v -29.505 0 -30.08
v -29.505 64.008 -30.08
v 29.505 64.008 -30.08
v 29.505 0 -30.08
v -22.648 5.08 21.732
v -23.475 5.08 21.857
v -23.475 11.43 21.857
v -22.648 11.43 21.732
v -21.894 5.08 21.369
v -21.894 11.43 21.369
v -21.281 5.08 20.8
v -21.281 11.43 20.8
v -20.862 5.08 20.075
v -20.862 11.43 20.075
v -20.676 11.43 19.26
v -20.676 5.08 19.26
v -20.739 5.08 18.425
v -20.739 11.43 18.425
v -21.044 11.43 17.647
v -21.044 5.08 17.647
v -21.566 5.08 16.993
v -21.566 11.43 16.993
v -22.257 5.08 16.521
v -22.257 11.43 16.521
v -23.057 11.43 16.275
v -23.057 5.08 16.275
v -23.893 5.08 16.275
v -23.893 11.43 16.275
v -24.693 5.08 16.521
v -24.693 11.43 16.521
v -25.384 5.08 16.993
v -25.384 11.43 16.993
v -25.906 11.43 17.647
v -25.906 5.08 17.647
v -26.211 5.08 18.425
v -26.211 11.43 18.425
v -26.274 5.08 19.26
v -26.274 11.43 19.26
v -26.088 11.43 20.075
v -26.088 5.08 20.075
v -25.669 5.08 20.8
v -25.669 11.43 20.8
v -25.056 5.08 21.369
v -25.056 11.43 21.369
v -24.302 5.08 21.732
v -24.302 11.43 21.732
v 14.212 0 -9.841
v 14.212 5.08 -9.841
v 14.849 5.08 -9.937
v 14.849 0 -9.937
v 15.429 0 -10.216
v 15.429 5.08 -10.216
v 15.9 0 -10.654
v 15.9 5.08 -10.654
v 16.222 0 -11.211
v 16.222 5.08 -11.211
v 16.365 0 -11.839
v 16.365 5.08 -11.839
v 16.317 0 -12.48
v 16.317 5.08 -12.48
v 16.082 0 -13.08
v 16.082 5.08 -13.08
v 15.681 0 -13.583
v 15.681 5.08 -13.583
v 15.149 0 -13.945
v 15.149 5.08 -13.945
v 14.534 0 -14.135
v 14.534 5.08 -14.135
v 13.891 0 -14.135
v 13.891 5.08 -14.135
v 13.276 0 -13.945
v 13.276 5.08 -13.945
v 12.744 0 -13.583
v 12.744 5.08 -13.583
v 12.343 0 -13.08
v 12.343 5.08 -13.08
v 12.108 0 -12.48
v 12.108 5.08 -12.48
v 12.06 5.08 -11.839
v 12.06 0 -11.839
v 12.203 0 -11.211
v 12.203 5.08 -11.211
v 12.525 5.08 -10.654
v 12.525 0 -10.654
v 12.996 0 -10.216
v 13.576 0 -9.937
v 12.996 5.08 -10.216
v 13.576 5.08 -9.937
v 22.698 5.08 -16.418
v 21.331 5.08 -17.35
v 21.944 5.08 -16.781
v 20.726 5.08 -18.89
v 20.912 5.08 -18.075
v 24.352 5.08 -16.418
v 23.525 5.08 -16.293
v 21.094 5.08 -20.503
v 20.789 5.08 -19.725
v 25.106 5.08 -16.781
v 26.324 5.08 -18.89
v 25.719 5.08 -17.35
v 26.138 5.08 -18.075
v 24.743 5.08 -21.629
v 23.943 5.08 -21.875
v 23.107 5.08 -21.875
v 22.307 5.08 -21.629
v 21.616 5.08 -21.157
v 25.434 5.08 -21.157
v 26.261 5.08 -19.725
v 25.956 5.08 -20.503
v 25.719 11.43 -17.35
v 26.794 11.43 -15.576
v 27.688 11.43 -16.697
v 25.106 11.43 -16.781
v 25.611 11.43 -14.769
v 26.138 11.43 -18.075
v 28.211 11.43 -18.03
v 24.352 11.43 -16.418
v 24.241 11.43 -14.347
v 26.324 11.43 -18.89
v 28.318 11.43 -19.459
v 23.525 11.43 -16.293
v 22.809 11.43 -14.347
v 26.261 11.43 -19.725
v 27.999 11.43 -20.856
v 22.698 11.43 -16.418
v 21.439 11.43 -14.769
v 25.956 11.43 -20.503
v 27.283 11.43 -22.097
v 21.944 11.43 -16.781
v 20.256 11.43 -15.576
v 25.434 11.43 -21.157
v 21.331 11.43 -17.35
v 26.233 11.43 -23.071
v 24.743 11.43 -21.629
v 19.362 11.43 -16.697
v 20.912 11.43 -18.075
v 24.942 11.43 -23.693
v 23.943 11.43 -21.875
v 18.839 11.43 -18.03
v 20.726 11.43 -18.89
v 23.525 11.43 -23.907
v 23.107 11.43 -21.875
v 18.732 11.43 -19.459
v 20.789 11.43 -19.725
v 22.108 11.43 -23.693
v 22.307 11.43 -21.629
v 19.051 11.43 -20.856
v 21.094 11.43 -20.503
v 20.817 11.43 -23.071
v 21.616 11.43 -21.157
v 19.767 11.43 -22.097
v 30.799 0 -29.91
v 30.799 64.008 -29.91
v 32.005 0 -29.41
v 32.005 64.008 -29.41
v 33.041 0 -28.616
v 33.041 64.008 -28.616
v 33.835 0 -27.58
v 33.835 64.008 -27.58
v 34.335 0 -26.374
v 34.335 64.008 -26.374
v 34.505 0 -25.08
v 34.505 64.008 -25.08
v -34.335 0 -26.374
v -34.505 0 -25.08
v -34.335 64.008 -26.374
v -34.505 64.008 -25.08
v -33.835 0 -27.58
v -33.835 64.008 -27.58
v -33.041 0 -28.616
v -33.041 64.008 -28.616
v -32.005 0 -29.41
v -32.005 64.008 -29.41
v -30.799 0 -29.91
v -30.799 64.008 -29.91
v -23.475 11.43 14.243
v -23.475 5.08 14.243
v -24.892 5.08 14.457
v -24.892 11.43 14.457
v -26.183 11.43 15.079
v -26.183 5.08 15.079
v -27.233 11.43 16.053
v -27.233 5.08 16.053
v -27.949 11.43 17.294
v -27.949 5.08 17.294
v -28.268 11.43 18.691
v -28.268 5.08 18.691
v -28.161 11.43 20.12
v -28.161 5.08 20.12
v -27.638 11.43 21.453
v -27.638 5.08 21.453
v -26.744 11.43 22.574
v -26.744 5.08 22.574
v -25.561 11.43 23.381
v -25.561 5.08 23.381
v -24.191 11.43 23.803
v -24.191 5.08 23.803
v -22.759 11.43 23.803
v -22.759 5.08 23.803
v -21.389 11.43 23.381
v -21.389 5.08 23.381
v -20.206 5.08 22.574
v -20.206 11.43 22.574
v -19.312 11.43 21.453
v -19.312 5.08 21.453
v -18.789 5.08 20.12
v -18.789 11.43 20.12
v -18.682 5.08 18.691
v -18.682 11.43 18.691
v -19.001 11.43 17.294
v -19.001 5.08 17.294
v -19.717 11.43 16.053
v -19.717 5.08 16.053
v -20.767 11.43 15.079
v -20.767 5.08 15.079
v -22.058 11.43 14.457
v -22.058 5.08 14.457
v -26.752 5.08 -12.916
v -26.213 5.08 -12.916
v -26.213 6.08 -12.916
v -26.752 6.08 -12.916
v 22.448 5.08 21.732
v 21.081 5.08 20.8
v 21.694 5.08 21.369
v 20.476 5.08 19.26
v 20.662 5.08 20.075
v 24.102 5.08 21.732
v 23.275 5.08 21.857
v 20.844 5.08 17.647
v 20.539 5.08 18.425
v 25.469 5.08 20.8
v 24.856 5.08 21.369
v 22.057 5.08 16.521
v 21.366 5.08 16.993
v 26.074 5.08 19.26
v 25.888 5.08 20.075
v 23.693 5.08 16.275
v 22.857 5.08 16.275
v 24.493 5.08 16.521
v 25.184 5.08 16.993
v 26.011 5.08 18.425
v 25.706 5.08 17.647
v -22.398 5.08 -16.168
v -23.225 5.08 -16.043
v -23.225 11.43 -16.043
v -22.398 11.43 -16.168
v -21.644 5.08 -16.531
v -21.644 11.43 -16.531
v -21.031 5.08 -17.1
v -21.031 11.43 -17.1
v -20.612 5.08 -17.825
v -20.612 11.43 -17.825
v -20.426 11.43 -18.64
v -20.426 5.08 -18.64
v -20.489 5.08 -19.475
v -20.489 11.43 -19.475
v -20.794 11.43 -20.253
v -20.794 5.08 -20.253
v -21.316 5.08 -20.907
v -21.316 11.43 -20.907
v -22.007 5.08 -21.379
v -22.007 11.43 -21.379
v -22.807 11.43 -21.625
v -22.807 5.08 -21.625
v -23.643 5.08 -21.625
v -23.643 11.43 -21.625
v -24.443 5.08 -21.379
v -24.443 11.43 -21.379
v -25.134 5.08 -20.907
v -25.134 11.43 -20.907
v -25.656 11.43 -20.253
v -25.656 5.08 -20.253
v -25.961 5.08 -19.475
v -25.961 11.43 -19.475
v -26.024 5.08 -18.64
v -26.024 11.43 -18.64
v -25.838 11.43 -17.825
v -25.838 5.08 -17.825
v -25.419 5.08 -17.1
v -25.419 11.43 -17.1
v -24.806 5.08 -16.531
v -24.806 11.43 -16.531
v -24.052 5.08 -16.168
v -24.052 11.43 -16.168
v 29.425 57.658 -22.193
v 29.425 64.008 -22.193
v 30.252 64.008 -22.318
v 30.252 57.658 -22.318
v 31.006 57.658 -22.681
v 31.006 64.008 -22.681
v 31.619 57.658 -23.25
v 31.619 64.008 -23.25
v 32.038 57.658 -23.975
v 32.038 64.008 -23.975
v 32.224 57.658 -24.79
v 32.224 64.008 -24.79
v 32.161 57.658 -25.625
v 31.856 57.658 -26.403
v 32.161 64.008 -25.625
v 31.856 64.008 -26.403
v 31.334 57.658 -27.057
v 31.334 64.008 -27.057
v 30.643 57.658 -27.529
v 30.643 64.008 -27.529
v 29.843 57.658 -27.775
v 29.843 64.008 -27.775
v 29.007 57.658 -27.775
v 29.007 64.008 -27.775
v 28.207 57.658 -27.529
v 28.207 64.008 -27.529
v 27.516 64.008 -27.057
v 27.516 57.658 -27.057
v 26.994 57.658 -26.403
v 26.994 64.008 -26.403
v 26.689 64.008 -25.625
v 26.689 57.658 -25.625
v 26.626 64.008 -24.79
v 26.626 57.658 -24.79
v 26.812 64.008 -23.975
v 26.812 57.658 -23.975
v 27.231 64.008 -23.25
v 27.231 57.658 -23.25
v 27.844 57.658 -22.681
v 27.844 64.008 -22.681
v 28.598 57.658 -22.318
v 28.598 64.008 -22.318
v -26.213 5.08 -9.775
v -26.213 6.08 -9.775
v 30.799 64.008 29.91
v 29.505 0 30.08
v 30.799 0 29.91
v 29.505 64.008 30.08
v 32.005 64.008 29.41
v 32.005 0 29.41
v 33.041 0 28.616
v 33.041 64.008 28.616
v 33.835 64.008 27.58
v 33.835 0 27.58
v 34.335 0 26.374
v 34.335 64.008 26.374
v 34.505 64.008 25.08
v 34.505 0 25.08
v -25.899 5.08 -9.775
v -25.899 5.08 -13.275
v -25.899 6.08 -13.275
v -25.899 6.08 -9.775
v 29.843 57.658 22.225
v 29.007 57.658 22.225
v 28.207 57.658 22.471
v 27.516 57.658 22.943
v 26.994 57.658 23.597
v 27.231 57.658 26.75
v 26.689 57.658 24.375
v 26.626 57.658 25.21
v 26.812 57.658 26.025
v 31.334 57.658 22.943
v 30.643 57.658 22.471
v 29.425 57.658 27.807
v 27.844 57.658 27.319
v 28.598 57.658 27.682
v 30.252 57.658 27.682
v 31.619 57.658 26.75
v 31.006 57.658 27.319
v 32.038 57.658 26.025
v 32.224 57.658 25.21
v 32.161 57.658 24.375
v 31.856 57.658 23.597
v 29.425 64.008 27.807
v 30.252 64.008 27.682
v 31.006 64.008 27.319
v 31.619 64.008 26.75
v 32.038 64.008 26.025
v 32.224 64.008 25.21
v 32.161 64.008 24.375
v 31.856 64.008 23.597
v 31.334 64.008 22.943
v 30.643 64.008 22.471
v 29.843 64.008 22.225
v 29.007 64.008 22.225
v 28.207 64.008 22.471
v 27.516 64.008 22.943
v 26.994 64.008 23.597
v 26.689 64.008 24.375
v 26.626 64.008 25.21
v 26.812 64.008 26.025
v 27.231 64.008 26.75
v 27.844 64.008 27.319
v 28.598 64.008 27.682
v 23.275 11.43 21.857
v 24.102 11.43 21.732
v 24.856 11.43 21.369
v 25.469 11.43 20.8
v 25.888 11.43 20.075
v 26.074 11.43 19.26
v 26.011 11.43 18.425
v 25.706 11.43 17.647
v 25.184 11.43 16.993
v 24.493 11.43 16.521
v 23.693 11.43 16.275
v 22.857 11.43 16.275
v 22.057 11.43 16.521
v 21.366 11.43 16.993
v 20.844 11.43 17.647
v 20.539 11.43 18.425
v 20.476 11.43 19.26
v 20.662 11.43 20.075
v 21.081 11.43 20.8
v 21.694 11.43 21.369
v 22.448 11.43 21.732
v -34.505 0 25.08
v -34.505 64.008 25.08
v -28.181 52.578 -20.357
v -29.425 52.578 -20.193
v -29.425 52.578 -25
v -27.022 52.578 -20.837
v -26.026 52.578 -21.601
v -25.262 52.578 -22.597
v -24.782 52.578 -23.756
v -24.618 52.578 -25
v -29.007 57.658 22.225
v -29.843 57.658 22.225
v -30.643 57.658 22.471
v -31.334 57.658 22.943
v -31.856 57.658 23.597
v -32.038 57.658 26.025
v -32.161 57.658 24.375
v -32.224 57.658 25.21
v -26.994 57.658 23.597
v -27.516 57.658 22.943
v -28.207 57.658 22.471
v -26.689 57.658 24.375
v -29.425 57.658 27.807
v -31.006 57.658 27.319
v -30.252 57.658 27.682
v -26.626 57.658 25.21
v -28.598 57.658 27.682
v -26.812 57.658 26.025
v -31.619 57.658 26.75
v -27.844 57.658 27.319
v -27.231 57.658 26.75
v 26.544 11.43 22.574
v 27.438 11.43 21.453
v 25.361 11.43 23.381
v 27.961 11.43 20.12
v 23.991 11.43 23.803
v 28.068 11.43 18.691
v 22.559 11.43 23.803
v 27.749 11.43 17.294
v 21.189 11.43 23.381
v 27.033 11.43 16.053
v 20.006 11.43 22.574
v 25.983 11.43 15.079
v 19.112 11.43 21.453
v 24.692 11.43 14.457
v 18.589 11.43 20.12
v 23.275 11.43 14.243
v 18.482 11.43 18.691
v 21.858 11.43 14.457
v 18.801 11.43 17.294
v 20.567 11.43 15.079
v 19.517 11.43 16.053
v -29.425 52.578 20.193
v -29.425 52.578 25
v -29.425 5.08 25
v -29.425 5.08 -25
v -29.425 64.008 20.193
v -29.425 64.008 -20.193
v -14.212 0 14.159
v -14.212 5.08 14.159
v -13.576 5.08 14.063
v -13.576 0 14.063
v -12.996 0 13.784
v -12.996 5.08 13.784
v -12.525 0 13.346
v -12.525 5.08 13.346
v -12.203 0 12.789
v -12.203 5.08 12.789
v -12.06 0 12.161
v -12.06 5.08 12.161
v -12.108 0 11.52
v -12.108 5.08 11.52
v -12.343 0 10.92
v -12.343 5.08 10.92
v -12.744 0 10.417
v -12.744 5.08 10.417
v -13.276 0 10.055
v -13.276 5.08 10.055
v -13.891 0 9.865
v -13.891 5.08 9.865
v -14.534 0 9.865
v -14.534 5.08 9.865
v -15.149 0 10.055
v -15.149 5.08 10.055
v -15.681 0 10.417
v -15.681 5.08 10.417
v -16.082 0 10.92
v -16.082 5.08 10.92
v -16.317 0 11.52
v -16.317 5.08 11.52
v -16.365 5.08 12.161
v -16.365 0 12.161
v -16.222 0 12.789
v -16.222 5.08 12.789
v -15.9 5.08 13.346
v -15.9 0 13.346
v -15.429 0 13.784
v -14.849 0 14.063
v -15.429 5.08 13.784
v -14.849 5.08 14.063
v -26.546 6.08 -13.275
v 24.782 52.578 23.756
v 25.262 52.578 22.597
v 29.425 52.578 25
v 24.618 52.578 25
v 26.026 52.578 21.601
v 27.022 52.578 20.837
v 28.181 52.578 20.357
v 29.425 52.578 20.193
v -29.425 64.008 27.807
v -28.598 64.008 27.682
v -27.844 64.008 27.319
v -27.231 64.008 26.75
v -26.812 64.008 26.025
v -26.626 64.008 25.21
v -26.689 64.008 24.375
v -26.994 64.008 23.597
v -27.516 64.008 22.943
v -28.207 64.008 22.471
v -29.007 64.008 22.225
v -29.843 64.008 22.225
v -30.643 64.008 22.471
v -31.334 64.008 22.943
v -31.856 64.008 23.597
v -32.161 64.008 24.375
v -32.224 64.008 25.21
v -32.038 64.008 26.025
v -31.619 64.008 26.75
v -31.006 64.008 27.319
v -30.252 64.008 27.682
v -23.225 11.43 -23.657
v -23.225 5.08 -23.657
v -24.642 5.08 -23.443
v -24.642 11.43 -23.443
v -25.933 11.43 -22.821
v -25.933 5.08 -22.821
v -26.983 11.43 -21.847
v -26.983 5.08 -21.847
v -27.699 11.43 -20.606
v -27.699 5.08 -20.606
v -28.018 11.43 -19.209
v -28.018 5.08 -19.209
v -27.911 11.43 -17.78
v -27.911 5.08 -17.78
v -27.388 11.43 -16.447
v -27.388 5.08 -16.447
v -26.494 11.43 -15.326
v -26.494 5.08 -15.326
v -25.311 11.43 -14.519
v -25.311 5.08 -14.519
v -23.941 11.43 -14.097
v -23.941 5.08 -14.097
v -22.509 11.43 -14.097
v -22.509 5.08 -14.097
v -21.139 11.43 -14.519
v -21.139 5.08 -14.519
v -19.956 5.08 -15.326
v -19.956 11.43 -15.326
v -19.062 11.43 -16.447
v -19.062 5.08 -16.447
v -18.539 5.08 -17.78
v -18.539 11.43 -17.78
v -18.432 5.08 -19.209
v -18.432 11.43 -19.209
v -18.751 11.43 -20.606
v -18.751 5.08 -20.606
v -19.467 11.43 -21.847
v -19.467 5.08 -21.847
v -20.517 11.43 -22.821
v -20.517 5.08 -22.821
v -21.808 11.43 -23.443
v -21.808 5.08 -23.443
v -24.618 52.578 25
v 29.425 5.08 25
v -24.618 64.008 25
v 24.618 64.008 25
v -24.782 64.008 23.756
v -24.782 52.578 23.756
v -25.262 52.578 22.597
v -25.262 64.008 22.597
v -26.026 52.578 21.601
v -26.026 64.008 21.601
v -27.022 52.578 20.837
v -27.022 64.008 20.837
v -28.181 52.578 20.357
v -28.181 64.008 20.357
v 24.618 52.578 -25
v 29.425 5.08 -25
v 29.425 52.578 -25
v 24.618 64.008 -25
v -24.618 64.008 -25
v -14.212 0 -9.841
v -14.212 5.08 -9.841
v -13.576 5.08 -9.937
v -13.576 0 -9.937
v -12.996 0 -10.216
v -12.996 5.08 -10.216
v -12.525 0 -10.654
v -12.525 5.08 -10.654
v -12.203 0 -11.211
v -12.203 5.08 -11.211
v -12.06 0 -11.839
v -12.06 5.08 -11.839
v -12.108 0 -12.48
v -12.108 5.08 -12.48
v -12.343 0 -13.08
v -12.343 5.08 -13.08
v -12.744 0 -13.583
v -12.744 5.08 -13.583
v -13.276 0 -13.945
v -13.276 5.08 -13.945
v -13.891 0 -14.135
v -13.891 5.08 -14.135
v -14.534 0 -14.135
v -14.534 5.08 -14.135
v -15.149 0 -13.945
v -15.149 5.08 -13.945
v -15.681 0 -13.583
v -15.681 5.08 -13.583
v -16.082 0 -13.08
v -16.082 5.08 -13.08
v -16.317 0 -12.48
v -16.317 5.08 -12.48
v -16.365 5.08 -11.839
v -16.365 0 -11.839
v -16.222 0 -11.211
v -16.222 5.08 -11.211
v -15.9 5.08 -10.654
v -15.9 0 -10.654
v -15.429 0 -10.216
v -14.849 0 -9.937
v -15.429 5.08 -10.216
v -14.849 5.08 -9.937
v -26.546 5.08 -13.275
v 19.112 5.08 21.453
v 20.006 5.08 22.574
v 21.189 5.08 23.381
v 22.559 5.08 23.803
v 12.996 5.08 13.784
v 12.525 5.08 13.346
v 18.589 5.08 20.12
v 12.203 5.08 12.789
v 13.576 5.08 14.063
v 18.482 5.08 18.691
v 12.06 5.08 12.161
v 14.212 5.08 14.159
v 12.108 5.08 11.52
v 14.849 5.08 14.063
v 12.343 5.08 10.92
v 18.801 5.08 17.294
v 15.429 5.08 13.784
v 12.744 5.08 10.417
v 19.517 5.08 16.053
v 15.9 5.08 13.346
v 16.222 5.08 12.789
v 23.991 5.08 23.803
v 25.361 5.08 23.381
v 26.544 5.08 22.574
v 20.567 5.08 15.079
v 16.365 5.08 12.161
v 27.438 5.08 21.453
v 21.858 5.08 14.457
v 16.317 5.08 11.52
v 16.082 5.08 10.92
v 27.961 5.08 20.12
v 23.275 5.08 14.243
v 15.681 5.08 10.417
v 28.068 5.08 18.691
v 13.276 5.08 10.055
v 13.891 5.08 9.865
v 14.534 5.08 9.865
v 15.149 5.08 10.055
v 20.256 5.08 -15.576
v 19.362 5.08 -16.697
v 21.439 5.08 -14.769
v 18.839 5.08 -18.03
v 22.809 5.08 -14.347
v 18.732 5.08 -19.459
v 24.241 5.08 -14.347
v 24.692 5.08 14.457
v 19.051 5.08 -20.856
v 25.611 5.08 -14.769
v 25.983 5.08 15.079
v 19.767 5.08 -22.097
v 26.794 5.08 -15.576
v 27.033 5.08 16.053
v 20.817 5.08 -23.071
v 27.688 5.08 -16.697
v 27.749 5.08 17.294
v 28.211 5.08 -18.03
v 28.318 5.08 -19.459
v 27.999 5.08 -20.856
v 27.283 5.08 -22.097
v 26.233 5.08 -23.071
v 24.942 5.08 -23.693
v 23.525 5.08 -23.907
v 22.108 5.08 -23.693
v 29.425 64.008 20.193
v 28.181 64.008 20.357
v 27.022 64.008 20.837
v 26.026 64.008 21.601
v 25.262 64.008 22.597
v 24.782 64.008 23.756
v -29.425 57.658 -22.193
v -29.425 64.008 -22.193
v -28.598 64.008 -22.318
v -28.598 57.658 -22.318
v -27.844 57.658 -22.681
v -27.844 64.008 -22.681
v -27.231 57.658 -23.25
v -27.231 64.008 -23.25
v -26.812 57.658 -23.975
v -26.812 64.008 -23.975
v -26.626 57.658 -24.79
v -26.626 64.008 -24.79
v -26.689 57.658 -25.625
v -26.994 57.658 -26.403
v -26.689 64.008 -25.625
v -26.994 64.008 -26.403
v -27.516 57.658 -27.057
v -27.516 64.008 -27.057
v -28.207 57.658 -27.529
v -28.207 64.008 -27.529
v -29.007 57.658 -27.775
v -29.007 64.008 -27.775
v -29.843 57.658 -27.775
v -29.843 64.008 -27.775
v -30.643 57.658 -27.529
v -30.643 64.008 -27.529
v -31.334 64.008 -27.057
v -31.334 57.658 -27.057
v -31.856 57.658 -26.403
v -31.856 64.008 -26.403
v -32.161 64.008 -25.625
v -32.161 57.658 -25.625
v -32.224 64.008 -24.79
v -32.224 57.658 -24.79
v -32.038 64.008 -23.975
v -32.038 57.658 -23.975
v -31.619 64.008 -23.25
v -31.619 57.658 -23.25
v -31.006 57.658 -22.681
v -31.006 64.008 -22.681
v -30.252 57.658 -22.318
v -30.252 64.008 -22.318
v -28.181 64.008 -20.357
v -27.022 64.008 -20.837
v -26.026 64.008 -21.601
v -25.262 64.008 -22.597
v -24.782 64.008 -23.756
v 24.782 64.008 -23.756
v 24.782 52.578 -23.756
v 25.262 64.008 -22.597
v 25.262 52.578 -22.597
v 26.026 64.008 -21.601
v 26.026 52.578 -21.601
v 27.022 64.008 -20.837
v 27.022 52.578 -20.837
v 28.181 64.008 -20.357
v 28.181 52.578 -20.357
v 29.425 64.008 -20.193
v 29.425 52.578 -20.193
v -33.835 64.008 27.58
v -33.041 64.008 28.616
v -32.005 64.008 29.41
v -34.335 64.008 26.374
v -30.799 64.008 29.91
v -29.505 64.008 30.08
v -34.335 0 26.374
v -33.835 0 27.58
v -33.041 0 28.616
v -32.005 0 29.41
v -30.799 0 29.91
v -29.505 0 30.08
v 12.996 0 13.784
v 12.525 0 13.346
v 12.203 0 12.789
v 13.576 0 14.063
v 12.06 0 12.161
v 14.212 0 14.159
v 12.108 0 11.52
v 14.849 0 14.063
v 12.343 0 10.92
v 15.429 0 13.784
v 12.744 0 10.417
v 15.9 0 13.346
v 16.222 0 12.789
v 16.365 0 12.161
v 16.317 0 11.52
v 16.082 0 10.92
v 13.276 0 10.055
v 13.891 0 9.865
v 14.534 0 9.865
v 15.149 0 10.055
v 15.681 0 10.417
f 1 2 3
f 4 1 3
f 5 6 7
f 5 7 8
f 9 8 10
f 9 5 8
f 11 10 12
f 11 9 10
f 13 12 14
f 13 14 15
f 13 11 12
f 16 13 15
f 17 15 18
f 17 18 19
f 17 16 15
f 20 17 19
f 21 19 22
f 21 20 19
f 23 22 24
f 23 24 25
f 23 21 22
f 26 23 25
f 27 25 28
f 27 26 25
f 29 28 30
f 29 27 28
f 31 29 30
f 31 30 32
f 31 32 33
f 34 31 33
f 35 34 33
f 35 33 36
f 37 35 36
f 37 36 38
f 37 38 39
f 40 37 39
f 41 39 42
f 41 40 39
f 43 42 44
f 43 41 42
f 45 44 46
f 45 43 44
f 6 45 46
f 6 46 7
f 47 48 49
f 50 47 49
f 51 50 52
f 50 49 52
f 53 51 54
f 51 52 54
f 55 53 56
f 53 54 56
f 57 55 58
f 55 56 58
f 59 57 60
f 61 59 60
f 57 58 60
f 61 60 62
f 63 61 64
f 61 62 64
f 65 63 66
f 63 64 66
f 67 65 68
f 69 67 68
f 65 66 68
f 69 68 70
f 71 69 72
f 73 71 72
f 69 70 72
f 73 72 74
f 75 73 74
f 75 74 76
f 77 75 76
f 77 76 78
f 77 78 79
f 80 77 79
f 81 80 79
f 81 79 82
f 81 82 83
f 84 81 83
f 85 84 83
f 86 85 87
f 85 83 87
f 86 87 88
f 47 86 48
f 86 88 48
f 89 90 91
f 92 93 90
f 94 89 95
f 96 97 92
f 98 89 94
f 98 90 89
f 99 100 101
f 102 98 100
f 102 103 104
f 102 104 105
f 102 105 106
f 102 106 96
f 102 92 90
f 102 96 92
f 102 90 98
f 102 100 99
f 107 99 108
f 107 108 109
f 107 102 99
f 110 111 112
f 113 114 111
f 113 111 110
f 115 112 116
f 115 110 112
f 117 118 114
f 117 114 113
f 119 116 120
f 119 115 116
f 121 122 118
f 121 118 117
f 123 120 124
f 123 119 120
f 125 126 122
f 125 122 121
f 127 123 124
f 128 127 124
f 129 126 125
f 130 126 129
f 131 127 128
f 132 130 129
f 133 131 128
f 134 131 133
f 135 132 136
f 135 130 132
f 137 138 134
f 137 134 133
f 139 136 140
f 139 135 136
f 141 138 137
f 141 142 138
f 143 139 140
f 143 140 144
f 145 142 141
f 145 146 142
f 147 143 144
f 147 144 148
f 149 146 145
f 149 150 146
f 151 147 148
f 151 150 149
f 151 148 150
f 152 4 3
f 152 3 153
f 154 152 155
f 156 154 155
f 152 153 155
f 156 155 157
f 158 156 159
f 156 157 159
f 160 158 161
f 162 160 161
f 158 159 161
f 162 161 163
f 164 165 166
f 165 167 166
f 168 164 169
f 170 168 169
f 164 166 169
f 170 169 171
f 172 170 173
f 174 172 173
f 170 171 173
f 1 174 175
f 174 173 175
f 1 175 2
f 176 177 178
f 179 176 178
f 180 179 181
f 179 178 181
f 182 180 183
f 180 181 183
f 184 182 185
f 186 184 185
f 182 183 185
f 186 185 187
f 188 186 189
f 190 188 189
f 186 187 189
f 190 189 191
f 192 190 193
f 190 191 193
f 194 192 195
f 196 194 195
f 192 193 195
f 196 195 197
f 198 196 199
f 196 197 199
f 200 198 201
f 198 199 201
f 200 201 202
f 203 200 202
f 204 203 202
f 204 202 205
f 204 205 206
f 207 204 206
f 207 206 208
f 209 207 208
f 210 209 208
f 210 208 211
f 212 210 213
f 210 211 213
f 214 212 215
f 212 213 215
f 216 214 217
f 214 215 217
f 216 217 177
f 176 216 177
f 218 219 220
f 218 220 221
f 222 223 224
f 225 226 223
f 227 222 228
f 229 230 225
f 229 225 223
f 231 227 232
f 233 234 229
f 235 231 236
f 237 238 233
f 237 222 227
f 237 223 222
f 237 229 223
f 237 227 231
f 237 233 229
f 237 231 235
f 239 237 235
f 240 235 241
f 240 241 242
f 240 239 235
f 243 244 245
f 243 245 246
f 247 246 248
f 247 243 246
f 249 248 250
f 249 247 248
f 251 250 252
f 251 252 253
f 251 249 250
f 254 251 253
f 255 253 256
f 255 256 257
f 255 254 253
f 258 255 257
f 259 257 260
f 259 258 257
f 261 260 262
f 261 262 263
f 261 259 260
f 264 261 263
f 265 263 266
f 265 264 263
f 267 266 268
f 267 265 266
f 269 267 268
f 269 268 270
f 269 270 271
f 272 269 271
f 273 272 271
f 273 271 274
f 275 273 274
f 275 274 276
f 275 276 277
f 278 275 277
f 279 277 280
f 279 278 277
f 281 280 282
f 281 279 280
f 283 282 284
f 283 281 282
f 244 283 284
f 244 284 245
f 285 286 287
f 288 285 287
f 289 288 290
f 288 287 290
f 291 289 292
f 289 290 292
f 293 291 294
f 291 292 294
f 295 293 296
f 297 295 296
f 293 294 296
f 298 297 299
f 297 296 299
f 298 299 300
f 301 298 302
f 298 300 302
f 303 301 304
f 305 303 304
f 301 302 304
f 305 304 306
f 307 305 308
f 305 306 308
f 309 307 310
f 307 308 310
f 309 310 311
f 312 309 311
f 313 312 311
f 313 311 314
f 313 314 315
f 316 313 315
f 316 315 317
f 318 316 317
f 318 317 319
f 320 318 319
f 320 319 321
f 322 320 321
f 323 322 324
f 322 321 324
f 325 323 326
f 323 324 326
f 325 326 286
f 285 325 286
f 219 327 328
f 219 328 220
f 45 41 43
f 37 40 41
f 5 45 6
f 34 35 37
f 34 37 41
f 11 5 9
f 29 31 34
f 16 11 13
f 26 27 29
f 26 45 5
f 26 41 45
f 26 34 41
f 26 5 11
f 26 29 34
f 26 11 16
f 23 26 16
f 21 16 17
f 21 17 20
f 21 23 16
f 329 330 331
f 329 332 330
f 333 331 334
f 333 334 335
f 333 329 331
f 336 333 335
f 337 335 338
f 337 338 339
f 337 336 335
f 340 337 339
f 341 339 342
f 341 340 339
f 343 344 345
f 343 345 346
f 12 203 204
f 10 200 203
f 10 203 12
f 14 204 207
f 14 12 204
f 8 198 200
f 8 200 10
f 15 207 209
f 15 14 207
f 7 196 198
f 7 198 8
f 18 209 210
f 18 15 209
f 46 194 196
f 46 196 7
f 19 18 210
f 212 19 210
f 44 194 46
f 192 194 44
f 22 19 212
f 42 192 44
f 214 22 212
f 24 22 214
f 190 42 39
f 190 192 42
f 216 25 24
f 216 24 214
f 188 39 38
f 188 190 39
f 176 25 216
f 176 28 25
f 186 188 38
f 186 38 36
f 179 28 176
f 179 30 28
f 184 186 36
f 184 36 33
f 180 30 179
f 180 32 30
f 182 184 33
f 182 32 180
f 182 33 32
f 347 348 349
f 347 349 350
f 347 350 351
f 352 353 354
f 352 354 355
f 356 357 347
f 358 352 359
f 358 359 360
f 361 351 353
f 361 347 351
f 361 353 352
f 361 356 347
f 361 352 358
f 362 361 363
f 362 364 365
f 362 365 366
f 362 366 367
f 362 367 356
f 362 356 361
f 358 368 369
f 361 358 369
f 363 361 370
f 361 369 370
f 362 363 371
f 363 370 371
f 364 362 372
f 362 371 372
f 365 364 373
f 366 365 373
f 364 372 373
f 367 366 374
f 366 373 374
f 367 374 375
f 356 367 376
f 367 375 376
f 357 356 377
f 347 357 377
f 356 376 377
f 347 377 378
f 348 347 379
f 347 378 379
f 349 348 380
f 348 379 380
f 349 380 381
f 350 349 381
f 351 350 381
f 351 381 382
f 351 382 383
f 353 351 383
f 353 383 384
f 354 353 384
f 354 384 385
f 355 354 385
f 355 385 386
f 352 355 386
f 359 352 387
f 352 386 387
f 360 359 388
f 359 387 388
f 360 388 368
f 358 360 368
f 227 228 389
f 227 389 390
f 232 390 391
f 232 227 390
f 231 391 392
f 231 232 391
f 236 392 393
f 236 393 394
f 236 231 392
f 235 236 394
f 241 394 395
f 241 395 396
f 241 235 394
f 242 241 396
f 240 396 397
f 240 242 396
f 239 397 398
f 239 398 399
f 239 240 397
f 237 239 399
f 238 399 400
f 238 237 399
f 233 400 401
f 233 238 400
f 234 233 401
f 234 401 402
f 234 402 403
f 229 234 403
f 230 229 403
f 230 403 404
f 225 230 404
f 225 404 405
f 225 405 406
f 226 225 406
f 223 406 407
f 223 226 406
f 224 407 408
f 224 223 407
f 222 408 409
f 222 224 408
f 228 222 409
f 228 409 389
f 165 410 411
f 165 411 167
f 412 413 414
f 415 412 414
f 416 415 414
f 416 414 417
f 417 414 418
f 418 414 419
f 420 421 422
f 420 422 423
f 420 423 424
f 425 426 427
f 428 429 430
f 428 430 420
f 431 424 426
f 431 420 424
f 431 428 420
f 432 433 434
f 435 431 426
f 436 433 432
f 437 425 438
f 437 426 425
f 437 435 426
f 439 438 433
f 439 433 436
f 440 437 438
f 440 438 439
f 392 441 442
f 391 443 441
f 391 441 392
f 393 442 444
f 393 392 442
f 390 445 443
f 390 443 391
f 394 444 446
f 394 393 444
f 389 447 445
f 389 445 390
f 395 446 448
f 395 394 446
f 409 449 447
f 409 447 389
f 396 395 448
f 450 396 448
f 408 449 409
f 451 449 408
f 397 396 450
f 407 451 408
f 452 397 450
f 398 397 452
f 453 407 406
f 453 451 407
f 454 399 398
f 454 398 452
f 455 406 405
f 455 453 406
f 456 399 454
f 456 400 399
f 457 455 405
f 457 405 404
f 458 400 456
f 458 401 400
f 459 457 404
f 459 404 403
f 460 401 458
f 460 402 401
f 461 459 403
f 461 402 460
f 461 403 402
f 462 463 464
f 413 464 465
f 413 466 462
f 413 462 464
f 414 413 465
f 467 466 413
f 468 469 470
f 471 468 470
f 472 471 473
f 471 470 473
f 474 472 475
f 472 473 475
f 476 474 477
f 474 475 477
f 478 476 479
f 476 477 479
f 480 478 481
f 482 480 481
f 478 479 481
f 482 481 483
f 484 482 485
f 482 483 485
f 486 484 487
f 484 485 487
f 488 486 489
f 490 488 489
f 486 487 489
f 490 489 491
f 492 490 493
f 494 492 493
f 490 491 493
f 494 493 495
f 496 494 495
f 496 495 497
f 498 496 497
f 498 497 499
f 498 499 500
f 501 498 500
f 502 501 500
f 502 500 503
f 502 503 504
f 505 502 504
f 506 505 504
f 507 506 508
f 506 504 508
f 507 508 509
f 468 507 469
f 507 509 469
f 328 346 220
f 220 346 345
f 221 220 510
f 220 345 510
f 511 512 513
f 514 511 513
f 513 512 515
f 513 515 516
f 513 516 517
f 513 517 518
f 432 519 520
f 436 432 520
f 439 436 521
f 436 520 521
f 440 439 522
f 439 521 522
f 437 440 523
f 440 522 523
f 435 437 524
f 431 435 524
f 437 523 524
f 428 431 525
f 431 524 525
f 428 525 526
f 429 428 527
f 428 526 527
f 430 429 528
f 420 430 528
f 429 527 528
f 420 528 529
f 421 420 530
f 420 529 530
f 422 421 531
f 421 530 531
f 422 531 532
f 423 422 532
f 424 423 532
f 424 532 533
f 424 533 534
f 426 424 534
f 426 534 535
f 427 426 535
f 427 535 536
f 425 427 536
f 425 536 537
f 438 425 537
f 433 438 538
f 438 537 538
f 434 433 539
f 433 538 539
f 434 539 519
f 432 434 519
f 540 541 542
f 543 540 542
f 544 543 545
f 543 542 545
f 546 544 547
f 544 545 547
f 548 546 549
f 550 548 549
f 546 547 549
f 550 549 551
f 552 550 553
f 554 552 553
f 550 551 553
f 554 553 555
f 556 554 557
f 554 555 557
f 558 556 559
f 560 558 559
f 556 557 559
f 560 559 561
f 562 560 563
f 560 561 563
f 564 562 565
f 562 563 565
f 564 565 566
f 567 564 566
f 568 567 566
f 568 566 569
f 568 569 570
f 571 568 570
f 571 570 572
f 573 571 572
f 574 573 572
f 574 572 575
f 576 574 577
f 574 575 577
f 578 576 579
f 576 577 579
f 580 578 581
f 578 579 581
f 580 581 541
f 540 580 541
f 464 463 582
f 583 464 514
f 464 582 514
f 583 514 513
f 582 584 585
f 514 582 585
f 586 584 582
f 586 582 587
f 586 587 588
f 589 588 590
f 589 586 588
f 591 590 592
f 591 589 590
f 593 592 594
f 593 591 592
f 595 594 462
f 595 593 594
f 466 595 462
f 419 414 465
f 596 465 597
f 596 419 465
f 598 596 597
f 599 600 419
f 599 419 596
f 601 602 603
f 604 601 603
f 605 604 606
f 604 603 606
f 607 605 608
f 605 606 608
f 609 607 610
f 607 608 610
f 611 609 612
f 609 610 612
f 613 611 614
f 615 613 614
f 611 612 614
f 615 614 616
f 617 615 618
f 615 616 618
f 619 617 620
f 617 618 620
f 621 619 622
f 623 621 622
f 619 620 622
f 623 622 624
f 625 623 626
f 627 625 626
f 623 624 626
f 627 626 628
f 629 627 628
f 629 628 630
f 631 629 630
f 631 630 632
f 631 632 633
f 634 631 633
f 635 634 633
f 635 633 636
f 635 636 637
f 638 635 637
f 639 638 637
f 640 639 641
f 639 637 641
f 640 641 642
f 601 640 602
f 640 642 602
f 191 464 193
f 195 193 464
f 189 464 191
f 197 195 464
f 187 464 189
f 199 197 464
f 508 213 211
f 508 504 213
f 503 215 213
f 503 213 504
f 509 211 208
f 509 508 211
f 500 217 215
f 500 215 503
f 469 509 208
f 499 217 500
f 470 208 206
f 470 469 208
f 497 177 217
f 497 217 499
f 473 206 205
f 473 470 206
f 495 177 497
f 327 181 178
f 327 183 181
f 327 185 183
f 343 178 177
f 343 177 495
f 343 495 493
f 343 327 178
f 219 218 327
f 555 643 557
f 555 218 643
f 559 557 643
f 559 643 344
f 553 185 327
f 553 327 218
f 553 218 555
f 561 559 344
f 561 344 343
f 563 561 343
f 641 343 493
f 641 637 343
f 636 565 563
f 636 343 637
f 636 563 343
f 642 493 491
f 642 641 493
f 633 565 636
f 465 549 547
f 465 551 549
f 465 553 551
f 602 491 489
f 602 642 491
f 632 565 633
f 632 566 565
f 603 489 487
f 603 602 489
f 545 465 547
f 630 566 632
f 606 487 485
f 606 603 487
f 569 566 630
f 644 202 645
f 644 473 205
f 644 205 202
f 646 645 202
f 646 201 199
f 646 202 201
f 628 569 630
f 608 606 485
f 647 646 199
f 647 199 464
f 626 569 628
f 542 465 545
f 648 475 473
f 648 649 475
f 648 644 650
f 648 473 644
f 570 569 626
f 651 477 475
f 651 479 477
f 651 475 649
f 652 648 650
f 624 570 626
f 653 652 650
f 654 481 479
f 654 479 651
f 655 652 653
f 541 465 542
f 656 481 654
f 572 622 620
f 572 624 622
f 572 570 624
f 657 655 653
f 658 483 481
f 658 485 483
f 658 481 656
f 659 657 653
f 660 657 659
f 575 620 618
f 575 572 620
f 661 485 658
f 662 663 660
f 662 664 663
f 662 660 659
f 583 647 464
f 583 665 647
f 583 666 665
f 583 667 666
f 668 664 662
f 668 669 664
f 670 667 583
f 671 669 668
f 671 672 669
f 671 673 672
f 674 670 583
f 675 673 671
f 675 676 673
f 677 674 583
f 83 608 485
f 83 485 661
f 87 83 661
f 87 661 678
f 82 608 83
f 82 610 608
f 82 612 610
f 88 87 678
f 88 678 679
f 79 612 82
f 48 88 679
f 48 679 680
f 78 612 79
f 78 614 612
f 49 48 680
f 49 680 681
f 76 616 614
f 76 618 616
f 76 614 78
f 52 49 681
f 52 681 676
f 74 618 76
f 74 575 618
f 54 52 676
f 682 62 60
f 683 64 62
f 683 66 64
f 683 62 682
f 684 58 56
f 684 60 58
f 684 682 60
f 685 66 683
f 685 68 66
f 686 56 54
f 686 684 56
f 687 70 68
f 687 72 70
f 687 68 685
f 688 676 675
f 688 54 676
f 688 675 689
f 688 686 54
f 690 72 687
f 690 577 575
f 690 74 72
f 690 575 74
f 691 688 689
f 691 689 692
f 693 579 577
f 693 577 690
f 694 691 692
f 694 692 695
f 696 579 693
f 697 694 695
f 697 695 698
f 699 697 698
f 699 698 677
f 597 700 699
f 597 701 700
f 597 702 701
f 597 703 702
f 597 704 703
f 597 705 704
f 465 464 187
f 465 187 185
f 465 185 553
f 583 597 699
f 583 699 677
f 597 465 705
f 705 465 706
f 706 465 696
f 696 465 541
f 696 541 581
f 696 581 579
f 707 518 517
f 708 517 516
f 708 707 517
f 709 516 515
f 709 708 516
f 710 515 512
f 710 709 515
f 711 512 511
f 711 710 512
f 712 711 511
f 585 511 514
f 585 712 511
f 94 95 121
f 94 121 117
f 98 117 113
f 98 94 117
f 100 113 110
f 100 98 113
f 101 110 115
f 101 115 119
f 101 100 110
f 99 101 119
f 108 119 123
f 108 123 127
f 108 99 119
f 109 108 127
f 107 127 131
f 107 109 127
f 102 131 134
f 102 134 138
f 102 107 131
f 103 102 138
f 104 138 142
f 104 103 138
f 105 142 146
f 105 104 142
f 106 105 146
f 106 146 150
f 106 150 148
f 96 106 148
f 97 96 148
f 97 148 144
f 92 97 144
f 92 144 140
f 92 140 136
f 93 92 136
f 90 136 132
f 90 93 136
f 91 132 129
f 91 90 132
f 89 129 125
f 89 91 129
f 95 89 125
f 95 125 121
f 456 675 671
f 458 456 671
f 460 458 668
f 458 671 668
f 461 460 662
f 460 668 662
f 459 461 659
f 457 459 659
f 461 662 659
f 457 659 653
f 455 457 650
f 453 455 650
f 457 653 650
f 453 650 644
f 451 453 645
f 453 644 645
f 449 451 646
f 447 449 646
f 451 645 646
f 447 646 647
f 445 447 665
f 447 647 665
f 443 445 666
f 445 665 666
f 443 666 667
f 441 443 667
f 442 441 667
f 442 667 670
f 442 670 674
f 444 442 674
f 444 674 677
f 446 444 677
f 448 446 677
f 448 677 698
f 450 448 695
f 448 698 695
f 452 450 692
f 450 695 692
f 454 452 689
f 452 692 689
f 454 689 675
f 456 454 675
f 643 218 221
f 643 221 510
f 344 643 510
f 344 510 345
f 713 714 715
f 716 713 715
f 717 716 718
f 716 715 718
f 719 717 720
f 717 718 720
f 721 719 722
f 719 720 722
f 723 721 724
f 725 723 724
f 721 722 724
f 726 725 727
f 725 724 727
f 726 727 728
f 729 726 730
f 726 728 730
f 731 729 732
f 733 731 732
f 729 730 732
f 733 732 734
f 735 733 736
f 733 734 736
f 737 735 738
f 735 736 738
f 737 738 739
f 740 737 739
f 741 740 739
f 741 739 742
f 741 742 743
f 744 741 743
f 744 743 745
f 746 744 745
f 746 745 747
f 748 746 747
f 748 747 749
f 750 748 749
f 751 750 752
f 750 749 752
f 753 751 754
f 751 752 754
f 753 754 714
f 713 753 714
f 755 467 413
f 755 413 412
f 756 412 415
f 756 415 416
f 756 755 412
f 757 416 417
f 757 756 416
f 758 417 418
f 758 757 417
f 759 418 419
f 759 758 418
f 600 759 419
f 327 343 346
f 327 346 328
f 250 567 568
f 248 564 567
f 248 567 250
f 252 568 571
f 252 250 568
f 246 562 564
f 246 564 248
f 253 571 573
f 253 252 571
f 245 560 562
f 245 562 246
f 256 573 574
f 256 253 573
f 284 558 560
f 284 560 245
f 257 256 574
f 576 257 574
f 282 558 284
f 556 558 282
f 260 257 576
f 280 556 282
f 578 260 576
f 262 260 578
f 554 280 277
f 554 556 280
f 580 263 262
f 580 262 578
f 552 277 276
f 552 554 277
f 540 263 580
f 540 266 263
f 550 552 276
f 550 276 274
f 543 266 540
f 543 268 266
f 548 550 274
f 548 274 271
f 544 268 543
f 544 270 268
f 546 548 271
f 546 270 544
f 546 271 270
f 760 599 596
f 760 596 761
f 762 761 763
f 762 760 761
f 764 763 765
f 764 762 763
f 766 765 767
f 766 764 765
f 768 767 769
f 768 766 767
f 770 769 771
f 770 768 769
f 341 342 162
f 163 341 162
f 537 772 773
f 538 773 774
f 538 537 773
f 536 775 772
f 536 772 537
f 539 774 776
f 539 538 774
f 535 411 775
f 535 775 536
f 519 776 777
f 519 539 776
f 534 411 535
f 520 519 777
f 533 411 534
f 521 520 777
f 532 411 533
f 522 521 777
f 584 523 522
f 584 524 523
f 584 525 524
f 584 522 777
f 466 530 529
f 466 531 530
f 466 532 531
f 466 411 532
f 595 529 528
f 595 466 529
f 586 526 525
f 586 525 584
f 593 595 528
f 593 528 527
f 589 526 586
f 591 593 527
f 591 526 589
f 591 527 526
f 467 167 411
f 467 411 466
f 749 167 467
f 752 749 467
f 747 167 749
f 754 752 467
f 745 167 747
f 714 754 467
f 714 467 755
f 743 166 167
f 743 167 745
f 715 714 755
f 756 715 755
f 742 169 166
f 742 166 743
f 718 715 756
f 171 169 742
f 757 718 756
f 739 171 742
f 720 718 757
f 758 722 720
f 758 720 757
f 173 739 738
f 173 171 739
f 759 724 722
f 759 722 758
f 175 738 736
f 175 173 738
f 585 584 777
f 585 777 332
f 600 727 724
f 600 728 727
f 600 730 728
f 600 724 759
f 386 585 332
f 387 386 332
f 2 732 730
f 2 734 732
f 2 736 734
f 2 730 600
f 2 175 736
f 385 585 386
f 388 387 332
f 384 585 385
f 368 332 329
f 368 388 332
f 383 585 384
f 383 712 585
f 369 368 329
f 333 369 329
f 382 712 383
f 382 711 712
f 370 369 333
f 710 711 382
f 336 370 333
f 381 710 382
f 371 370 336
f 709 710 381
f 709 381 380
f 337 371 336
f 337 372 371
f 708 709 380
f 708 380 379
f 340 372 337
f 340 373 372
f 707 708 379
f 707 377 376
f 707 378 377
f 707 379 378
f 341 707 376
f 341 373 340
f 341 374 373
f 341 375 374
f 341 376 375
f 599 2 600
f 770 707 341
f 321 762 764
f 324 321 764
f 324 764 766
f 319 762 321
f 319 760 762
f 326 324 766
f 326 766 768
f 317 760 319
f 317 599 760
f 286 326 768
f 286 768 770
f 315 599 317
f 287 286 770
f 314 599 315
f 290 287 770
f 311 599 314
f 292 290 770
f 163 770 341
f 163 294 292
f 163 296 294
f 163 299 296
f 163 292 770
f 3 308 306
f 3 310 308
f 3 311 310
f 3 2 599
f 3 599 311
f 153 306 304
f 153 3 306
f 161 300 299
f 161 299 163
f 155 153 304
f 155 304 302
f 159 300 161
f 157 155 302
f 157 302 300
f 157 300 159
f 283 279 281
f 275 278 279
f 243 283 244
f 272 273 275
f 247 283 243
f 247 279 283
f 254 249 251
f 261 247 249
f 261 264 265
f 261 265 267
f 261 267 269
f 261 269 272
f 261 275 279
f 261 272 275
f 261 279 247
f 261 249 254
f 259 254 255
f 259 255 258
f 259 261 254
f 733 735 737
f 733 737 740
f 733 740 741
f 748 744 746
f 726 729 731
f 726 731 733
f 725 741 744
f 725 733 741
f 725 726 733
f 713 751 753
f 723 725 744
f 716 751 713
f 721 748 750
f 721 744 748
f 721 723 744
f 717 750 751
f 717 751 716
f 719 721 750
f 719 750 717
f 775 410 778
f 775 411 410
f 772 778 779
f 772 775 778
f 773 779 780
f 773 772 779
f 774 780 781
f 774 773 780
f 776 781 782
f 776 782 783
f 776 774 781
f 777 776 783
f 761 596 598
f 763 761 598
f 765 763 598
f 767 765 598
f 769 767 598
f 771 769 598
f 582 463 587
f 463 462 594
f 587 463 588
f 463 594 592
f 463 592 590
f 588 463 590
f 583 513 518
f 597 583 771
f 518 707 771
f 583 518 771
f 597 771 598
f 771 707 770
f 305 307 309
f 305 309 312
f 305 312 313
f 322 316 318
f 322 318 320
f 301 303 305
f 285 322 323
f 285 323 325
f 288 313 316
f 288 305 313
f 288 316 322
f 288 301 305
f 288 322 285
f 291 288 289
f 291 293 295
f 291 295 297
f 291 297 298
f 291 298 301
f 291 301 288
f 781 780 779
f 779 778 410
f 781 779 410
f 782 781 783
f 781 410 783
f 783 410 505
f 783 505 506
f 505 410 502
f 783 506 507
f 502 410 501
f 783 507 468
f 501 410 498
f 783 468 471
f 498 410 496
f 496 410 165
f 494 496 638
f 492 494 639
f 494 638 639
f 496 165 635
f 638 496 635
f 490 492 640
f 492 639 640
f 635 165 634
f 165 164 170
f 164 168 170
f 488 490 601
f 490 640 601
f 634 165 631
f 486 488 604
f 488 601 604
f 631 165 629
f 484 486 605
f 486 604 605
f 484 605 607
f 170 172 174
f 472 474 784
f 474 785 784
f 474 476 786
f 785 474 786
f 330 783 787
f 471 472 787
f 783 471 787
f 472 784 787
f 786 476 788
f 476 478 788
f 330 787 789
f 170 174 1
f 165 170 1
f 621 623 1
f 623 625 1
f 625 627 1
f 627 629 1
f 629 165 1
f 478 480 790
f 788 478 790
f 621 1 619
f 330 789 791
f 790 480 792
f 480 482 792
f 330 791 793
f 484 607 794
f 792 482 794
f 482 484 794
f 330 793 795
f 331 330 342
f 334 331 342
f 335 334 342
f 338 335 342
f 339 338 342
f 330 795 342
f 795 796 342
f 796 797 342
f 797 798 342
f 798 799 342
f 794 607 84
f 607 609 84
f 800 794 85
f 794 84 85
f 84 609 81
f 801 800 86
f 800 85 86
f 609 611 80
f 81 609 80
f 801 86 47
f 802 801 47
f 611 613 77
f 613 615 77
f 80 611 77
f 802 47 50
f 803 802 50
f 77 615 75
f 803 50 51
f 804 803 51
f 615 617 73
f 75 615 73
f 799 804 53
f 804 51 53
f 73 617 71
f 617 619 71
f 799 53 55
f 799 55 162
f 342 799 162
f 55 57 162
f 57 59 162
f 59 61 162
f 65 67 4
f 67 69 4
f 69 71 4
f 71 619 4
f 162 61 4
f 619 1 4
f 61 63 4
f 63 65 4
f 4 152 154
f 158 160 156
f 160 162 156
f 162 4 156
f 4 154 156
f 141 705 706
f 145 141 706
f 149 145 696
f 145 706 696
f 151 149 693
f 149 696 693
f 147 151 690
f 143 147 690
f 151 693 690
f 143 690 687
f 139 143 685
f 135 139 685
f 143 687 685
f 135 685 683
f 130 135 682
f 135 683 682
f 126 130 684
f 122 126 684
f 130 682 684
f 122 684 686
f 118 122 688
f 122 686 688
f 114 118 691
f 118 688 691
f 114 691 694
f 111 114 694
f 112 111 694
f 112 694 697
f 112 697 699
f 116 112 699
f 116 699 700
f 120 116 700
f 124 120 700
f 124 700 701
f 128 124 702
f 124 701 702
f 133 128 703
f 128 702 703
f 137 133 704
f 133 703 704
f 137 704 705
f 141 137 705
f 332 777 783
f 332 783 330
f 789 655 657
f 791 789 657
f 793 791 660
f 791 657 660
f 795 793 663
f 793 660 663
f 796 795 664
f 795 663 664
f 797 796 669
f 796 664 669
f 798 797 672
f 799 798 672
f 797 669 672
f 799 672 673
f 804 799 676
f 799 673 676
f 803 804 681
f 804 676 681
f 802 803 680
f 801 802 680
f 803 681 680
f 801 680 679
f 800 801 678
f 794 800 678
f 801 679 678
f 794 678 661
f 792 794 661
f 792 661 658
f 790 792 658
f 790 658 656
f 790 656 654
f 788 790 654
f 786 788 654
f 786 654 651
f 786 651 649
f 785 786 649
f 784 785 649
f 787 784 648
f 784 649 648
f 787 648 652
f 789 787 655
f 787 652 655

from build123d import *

# Parameters (mm, degrees)
SKETCH1_W           = 69.01
SKETCH1_H           = 60.16
BOSS_EXTRUDE3_DEPTH = 64.008
SKETCH2_W           = 58.85
SKETCH2_H           = 50
CUT_EXTRUDE4_DEPTH  = 58.928
FILLET1_R           = 5
SKETCH3_R           = 4.8067
BOSS_EXTRUDE4_DEPTH = 11.43
SKETCH3_3_R         = 2.8067
CUT_EXTRUDE5_DEPTH  = 6.35
SKETCH9_R           = 4.8067
SKETCH9_R_2         = 2.8067
BOSS_EXTRUDE5_DEPTH = 6.35
SKETCH10_R          = 2.159
CUT_EXTRUDE6_DEPTH  = 5.08
BOSS_EXTRUDE6_DEPTH = 1


with BuildPart() as part:
    # Sketch1 → Boss-Extrude3 (new body)
    with BuildSketch(Plane(origin=(0, 0, 0), x_dir=(1, 0, 0), z_dir=(0, 1, 0))):
        Rectangle(SKETCH1_W, SKETCH1_H)
    extrude(amount=BOSS_EXTRUDE3_DEPTH)

    # Sketch2 → Cut-Extrude4 (cut)
    with BuildSketch(Plane(origin=(0, 64.008, 0), x_dir=(1, 0, 0), z_dir=(0, 1, 0))):
        Rectangle(SKETCH2_W, SKETCH2_H)
    extrude(amount=-CUT_EXTRUDE4_DEPTH, mode=Mode.SUBTRACT)

    # Fillet1
    fillet1_edges = [part.edges().sort_by_distance(p)[0] for p in [
        (-34.505, 32.004, 30.08),
        (34.505, 32.004, 30.08),
        (34.505, 32.004, -30.08),
        (-34.505, 32.004, -30.08),
    ]]
    fillet(fillet1_edges, radius=FILLET1_R)

    # Sketch3 → Boss-Extrude4 (add)
    with BuildSketch(Plane(origin=(0, 64.008, 0), x_dir=(1, 0, 0), z_dir=(0, 1, 0))):
        with Locations((-29.425, 25)):
            Circle(SKETCH3_R)
        with Locations((29.425, 25)):
            Circle(SKETCH3_R)
        with Locations((-29.425, -25)):
            Circle(SKETCH3_R)
        with Locations((29.425, -25)):
            Circle(SKETCH3_R)
    extrude(amount=-BOSS_EXTRUDE4_DEPTH)

    # Sketch3<3> → Cut-Extrude5 (cut)
    with BuildSketch(Plane(origin=(0, 64.008, 0), x_dir=(1, 0, 0), z_dir=(0, 1, 0))):
        with Locations(Location((-29.425, 25, 0), (0, 0, 270))):
            Circle(SKETCH3_3_R)
        with Locations(Location((29.425, 25, 0), (0, 0, 270))):
            Circle(SKETCH3_3_R)
        with Locations(Location((29.425, -25, 0), (0, 0, 270))):
            Circle(SKETCH3_3_R)
        with Locations(Location((-29.425, -25, 0), (0, 0, 270))):
            Circle(SKETCH3_3_R)
    extrude(amount=-CUT_EXTRUDE5_DEPTH, mode=Mode.SUBTRACT)

    # Sketch9 → Boss-Extrude5 (add)
    # profile 1 of 4: a face of its own
    with BuildSketch(Plane(origin=(0, 5.08, 0), x_dir=(1, 0, 0), z_dir=(0, 1, 0))):
        with Locations(Location((-23.225, 18.85, 0), (0, 0, 90))):
            Circle(SKETCH9_R)
        with Locations(Location((-23.225, 18.85, 0), (0, 0, 270))):
            Circle(SKETCH9_R_2, mode=Mode.SUBTRACT)
    # profile 2 of 4: a face of its own
    with BuildSketch(Plane(origin=(0, 5.08, 0), x_dir=(1, 0, 0), z_dir=(0, 1, 0))):
        with Locations(Location((23.525, 19.1, 0), (0, 0, 90))):
            Circle(SKETCH9_R)
        with Locations(Location((23.525, 19.1, 0), (0, 0, 270))):
            Circle(SKETCH9_R_2, mode=Mode.SUBTRACT)
    # profile 3 of 4: a face of its own
    with BuildSketch(Plane(origin=(0, 5.08, 0), x_dir=(1, 0, 0), z_dir=(0, 1, 0))):
        with Locations(Location((23.275, -19.05, 0), (0, 0, 90))):
            Circle(SKETCH9_R)
        with Locations(Location((23.275, -19.05, 0), (0, 0, 270))):
            Circle(SKETCH9_R_2, mode=Mode.SUBTRACT)
    # profile 4 of 4: a face of its own
    with BuildSketch(Plane(origin=(0, 5.08, 0), x_dir=(1, 0, 0), z_dir=(0, 1, 0))):
        with Locations(Location((-23.475, -19.05, 0), (0, 0, 90))):
            Circle(SKETCH9_R)
        with Locations(Location((-23.475, -19.05, 0), (0, 0, 270))):
            Circle(SKETCH9_R_2, mode=Mode.SUBTRACT)
    extrude(amount=BOSS_EXTRUDE5_DEPTH)

    # Sketch10 → Cut-Extrude6 (cut)
    with BuildSketch(Plane(origin=(0, 5.08, 0), x_dir=(1, 0, 0), z_dir=(0, 1, 0))):
        with Locations(Location((14.2125, 12, 0), (0, 0, 270))):
            Circle(SKETCH10_R)
        with Locations(Location((14.2125, -12, 0), (0, 0, 270))):
            Circle(SKETCH10_R)
        with Locations(Location((-14.2125, 12, 0), (0, 0, 270))):
            Circle(SKETCH10_R)
        with Locations(Location((-14.2125, -12, 0), (0, 0, 270))):
            Circle(SKETCH10_R)
    extrude(amount=-CUT_EXTRUDE6_DEPTH, mode=Mode.SUBTRACT)

    # Sketch12 → Boss-Extrude6 (add)
    with BuildSketch(Plane(origin=(0, 5.08, 0), x_dir=(1, 0, 0), z_dir=(0, 1, 0))):
        Polygon((-26.546494391, 13.274758956), (-25.899358974, 13.274758956), (-25.899358974, 9.774758956), (-26.213461538, 9.774758956), (-26.213461538, 12.915784597), (-26.751923077, 12.915784597), align=None)
    extrude(amount=BOSS_EXTRUDE6_DEPTH)


solid = part.part
